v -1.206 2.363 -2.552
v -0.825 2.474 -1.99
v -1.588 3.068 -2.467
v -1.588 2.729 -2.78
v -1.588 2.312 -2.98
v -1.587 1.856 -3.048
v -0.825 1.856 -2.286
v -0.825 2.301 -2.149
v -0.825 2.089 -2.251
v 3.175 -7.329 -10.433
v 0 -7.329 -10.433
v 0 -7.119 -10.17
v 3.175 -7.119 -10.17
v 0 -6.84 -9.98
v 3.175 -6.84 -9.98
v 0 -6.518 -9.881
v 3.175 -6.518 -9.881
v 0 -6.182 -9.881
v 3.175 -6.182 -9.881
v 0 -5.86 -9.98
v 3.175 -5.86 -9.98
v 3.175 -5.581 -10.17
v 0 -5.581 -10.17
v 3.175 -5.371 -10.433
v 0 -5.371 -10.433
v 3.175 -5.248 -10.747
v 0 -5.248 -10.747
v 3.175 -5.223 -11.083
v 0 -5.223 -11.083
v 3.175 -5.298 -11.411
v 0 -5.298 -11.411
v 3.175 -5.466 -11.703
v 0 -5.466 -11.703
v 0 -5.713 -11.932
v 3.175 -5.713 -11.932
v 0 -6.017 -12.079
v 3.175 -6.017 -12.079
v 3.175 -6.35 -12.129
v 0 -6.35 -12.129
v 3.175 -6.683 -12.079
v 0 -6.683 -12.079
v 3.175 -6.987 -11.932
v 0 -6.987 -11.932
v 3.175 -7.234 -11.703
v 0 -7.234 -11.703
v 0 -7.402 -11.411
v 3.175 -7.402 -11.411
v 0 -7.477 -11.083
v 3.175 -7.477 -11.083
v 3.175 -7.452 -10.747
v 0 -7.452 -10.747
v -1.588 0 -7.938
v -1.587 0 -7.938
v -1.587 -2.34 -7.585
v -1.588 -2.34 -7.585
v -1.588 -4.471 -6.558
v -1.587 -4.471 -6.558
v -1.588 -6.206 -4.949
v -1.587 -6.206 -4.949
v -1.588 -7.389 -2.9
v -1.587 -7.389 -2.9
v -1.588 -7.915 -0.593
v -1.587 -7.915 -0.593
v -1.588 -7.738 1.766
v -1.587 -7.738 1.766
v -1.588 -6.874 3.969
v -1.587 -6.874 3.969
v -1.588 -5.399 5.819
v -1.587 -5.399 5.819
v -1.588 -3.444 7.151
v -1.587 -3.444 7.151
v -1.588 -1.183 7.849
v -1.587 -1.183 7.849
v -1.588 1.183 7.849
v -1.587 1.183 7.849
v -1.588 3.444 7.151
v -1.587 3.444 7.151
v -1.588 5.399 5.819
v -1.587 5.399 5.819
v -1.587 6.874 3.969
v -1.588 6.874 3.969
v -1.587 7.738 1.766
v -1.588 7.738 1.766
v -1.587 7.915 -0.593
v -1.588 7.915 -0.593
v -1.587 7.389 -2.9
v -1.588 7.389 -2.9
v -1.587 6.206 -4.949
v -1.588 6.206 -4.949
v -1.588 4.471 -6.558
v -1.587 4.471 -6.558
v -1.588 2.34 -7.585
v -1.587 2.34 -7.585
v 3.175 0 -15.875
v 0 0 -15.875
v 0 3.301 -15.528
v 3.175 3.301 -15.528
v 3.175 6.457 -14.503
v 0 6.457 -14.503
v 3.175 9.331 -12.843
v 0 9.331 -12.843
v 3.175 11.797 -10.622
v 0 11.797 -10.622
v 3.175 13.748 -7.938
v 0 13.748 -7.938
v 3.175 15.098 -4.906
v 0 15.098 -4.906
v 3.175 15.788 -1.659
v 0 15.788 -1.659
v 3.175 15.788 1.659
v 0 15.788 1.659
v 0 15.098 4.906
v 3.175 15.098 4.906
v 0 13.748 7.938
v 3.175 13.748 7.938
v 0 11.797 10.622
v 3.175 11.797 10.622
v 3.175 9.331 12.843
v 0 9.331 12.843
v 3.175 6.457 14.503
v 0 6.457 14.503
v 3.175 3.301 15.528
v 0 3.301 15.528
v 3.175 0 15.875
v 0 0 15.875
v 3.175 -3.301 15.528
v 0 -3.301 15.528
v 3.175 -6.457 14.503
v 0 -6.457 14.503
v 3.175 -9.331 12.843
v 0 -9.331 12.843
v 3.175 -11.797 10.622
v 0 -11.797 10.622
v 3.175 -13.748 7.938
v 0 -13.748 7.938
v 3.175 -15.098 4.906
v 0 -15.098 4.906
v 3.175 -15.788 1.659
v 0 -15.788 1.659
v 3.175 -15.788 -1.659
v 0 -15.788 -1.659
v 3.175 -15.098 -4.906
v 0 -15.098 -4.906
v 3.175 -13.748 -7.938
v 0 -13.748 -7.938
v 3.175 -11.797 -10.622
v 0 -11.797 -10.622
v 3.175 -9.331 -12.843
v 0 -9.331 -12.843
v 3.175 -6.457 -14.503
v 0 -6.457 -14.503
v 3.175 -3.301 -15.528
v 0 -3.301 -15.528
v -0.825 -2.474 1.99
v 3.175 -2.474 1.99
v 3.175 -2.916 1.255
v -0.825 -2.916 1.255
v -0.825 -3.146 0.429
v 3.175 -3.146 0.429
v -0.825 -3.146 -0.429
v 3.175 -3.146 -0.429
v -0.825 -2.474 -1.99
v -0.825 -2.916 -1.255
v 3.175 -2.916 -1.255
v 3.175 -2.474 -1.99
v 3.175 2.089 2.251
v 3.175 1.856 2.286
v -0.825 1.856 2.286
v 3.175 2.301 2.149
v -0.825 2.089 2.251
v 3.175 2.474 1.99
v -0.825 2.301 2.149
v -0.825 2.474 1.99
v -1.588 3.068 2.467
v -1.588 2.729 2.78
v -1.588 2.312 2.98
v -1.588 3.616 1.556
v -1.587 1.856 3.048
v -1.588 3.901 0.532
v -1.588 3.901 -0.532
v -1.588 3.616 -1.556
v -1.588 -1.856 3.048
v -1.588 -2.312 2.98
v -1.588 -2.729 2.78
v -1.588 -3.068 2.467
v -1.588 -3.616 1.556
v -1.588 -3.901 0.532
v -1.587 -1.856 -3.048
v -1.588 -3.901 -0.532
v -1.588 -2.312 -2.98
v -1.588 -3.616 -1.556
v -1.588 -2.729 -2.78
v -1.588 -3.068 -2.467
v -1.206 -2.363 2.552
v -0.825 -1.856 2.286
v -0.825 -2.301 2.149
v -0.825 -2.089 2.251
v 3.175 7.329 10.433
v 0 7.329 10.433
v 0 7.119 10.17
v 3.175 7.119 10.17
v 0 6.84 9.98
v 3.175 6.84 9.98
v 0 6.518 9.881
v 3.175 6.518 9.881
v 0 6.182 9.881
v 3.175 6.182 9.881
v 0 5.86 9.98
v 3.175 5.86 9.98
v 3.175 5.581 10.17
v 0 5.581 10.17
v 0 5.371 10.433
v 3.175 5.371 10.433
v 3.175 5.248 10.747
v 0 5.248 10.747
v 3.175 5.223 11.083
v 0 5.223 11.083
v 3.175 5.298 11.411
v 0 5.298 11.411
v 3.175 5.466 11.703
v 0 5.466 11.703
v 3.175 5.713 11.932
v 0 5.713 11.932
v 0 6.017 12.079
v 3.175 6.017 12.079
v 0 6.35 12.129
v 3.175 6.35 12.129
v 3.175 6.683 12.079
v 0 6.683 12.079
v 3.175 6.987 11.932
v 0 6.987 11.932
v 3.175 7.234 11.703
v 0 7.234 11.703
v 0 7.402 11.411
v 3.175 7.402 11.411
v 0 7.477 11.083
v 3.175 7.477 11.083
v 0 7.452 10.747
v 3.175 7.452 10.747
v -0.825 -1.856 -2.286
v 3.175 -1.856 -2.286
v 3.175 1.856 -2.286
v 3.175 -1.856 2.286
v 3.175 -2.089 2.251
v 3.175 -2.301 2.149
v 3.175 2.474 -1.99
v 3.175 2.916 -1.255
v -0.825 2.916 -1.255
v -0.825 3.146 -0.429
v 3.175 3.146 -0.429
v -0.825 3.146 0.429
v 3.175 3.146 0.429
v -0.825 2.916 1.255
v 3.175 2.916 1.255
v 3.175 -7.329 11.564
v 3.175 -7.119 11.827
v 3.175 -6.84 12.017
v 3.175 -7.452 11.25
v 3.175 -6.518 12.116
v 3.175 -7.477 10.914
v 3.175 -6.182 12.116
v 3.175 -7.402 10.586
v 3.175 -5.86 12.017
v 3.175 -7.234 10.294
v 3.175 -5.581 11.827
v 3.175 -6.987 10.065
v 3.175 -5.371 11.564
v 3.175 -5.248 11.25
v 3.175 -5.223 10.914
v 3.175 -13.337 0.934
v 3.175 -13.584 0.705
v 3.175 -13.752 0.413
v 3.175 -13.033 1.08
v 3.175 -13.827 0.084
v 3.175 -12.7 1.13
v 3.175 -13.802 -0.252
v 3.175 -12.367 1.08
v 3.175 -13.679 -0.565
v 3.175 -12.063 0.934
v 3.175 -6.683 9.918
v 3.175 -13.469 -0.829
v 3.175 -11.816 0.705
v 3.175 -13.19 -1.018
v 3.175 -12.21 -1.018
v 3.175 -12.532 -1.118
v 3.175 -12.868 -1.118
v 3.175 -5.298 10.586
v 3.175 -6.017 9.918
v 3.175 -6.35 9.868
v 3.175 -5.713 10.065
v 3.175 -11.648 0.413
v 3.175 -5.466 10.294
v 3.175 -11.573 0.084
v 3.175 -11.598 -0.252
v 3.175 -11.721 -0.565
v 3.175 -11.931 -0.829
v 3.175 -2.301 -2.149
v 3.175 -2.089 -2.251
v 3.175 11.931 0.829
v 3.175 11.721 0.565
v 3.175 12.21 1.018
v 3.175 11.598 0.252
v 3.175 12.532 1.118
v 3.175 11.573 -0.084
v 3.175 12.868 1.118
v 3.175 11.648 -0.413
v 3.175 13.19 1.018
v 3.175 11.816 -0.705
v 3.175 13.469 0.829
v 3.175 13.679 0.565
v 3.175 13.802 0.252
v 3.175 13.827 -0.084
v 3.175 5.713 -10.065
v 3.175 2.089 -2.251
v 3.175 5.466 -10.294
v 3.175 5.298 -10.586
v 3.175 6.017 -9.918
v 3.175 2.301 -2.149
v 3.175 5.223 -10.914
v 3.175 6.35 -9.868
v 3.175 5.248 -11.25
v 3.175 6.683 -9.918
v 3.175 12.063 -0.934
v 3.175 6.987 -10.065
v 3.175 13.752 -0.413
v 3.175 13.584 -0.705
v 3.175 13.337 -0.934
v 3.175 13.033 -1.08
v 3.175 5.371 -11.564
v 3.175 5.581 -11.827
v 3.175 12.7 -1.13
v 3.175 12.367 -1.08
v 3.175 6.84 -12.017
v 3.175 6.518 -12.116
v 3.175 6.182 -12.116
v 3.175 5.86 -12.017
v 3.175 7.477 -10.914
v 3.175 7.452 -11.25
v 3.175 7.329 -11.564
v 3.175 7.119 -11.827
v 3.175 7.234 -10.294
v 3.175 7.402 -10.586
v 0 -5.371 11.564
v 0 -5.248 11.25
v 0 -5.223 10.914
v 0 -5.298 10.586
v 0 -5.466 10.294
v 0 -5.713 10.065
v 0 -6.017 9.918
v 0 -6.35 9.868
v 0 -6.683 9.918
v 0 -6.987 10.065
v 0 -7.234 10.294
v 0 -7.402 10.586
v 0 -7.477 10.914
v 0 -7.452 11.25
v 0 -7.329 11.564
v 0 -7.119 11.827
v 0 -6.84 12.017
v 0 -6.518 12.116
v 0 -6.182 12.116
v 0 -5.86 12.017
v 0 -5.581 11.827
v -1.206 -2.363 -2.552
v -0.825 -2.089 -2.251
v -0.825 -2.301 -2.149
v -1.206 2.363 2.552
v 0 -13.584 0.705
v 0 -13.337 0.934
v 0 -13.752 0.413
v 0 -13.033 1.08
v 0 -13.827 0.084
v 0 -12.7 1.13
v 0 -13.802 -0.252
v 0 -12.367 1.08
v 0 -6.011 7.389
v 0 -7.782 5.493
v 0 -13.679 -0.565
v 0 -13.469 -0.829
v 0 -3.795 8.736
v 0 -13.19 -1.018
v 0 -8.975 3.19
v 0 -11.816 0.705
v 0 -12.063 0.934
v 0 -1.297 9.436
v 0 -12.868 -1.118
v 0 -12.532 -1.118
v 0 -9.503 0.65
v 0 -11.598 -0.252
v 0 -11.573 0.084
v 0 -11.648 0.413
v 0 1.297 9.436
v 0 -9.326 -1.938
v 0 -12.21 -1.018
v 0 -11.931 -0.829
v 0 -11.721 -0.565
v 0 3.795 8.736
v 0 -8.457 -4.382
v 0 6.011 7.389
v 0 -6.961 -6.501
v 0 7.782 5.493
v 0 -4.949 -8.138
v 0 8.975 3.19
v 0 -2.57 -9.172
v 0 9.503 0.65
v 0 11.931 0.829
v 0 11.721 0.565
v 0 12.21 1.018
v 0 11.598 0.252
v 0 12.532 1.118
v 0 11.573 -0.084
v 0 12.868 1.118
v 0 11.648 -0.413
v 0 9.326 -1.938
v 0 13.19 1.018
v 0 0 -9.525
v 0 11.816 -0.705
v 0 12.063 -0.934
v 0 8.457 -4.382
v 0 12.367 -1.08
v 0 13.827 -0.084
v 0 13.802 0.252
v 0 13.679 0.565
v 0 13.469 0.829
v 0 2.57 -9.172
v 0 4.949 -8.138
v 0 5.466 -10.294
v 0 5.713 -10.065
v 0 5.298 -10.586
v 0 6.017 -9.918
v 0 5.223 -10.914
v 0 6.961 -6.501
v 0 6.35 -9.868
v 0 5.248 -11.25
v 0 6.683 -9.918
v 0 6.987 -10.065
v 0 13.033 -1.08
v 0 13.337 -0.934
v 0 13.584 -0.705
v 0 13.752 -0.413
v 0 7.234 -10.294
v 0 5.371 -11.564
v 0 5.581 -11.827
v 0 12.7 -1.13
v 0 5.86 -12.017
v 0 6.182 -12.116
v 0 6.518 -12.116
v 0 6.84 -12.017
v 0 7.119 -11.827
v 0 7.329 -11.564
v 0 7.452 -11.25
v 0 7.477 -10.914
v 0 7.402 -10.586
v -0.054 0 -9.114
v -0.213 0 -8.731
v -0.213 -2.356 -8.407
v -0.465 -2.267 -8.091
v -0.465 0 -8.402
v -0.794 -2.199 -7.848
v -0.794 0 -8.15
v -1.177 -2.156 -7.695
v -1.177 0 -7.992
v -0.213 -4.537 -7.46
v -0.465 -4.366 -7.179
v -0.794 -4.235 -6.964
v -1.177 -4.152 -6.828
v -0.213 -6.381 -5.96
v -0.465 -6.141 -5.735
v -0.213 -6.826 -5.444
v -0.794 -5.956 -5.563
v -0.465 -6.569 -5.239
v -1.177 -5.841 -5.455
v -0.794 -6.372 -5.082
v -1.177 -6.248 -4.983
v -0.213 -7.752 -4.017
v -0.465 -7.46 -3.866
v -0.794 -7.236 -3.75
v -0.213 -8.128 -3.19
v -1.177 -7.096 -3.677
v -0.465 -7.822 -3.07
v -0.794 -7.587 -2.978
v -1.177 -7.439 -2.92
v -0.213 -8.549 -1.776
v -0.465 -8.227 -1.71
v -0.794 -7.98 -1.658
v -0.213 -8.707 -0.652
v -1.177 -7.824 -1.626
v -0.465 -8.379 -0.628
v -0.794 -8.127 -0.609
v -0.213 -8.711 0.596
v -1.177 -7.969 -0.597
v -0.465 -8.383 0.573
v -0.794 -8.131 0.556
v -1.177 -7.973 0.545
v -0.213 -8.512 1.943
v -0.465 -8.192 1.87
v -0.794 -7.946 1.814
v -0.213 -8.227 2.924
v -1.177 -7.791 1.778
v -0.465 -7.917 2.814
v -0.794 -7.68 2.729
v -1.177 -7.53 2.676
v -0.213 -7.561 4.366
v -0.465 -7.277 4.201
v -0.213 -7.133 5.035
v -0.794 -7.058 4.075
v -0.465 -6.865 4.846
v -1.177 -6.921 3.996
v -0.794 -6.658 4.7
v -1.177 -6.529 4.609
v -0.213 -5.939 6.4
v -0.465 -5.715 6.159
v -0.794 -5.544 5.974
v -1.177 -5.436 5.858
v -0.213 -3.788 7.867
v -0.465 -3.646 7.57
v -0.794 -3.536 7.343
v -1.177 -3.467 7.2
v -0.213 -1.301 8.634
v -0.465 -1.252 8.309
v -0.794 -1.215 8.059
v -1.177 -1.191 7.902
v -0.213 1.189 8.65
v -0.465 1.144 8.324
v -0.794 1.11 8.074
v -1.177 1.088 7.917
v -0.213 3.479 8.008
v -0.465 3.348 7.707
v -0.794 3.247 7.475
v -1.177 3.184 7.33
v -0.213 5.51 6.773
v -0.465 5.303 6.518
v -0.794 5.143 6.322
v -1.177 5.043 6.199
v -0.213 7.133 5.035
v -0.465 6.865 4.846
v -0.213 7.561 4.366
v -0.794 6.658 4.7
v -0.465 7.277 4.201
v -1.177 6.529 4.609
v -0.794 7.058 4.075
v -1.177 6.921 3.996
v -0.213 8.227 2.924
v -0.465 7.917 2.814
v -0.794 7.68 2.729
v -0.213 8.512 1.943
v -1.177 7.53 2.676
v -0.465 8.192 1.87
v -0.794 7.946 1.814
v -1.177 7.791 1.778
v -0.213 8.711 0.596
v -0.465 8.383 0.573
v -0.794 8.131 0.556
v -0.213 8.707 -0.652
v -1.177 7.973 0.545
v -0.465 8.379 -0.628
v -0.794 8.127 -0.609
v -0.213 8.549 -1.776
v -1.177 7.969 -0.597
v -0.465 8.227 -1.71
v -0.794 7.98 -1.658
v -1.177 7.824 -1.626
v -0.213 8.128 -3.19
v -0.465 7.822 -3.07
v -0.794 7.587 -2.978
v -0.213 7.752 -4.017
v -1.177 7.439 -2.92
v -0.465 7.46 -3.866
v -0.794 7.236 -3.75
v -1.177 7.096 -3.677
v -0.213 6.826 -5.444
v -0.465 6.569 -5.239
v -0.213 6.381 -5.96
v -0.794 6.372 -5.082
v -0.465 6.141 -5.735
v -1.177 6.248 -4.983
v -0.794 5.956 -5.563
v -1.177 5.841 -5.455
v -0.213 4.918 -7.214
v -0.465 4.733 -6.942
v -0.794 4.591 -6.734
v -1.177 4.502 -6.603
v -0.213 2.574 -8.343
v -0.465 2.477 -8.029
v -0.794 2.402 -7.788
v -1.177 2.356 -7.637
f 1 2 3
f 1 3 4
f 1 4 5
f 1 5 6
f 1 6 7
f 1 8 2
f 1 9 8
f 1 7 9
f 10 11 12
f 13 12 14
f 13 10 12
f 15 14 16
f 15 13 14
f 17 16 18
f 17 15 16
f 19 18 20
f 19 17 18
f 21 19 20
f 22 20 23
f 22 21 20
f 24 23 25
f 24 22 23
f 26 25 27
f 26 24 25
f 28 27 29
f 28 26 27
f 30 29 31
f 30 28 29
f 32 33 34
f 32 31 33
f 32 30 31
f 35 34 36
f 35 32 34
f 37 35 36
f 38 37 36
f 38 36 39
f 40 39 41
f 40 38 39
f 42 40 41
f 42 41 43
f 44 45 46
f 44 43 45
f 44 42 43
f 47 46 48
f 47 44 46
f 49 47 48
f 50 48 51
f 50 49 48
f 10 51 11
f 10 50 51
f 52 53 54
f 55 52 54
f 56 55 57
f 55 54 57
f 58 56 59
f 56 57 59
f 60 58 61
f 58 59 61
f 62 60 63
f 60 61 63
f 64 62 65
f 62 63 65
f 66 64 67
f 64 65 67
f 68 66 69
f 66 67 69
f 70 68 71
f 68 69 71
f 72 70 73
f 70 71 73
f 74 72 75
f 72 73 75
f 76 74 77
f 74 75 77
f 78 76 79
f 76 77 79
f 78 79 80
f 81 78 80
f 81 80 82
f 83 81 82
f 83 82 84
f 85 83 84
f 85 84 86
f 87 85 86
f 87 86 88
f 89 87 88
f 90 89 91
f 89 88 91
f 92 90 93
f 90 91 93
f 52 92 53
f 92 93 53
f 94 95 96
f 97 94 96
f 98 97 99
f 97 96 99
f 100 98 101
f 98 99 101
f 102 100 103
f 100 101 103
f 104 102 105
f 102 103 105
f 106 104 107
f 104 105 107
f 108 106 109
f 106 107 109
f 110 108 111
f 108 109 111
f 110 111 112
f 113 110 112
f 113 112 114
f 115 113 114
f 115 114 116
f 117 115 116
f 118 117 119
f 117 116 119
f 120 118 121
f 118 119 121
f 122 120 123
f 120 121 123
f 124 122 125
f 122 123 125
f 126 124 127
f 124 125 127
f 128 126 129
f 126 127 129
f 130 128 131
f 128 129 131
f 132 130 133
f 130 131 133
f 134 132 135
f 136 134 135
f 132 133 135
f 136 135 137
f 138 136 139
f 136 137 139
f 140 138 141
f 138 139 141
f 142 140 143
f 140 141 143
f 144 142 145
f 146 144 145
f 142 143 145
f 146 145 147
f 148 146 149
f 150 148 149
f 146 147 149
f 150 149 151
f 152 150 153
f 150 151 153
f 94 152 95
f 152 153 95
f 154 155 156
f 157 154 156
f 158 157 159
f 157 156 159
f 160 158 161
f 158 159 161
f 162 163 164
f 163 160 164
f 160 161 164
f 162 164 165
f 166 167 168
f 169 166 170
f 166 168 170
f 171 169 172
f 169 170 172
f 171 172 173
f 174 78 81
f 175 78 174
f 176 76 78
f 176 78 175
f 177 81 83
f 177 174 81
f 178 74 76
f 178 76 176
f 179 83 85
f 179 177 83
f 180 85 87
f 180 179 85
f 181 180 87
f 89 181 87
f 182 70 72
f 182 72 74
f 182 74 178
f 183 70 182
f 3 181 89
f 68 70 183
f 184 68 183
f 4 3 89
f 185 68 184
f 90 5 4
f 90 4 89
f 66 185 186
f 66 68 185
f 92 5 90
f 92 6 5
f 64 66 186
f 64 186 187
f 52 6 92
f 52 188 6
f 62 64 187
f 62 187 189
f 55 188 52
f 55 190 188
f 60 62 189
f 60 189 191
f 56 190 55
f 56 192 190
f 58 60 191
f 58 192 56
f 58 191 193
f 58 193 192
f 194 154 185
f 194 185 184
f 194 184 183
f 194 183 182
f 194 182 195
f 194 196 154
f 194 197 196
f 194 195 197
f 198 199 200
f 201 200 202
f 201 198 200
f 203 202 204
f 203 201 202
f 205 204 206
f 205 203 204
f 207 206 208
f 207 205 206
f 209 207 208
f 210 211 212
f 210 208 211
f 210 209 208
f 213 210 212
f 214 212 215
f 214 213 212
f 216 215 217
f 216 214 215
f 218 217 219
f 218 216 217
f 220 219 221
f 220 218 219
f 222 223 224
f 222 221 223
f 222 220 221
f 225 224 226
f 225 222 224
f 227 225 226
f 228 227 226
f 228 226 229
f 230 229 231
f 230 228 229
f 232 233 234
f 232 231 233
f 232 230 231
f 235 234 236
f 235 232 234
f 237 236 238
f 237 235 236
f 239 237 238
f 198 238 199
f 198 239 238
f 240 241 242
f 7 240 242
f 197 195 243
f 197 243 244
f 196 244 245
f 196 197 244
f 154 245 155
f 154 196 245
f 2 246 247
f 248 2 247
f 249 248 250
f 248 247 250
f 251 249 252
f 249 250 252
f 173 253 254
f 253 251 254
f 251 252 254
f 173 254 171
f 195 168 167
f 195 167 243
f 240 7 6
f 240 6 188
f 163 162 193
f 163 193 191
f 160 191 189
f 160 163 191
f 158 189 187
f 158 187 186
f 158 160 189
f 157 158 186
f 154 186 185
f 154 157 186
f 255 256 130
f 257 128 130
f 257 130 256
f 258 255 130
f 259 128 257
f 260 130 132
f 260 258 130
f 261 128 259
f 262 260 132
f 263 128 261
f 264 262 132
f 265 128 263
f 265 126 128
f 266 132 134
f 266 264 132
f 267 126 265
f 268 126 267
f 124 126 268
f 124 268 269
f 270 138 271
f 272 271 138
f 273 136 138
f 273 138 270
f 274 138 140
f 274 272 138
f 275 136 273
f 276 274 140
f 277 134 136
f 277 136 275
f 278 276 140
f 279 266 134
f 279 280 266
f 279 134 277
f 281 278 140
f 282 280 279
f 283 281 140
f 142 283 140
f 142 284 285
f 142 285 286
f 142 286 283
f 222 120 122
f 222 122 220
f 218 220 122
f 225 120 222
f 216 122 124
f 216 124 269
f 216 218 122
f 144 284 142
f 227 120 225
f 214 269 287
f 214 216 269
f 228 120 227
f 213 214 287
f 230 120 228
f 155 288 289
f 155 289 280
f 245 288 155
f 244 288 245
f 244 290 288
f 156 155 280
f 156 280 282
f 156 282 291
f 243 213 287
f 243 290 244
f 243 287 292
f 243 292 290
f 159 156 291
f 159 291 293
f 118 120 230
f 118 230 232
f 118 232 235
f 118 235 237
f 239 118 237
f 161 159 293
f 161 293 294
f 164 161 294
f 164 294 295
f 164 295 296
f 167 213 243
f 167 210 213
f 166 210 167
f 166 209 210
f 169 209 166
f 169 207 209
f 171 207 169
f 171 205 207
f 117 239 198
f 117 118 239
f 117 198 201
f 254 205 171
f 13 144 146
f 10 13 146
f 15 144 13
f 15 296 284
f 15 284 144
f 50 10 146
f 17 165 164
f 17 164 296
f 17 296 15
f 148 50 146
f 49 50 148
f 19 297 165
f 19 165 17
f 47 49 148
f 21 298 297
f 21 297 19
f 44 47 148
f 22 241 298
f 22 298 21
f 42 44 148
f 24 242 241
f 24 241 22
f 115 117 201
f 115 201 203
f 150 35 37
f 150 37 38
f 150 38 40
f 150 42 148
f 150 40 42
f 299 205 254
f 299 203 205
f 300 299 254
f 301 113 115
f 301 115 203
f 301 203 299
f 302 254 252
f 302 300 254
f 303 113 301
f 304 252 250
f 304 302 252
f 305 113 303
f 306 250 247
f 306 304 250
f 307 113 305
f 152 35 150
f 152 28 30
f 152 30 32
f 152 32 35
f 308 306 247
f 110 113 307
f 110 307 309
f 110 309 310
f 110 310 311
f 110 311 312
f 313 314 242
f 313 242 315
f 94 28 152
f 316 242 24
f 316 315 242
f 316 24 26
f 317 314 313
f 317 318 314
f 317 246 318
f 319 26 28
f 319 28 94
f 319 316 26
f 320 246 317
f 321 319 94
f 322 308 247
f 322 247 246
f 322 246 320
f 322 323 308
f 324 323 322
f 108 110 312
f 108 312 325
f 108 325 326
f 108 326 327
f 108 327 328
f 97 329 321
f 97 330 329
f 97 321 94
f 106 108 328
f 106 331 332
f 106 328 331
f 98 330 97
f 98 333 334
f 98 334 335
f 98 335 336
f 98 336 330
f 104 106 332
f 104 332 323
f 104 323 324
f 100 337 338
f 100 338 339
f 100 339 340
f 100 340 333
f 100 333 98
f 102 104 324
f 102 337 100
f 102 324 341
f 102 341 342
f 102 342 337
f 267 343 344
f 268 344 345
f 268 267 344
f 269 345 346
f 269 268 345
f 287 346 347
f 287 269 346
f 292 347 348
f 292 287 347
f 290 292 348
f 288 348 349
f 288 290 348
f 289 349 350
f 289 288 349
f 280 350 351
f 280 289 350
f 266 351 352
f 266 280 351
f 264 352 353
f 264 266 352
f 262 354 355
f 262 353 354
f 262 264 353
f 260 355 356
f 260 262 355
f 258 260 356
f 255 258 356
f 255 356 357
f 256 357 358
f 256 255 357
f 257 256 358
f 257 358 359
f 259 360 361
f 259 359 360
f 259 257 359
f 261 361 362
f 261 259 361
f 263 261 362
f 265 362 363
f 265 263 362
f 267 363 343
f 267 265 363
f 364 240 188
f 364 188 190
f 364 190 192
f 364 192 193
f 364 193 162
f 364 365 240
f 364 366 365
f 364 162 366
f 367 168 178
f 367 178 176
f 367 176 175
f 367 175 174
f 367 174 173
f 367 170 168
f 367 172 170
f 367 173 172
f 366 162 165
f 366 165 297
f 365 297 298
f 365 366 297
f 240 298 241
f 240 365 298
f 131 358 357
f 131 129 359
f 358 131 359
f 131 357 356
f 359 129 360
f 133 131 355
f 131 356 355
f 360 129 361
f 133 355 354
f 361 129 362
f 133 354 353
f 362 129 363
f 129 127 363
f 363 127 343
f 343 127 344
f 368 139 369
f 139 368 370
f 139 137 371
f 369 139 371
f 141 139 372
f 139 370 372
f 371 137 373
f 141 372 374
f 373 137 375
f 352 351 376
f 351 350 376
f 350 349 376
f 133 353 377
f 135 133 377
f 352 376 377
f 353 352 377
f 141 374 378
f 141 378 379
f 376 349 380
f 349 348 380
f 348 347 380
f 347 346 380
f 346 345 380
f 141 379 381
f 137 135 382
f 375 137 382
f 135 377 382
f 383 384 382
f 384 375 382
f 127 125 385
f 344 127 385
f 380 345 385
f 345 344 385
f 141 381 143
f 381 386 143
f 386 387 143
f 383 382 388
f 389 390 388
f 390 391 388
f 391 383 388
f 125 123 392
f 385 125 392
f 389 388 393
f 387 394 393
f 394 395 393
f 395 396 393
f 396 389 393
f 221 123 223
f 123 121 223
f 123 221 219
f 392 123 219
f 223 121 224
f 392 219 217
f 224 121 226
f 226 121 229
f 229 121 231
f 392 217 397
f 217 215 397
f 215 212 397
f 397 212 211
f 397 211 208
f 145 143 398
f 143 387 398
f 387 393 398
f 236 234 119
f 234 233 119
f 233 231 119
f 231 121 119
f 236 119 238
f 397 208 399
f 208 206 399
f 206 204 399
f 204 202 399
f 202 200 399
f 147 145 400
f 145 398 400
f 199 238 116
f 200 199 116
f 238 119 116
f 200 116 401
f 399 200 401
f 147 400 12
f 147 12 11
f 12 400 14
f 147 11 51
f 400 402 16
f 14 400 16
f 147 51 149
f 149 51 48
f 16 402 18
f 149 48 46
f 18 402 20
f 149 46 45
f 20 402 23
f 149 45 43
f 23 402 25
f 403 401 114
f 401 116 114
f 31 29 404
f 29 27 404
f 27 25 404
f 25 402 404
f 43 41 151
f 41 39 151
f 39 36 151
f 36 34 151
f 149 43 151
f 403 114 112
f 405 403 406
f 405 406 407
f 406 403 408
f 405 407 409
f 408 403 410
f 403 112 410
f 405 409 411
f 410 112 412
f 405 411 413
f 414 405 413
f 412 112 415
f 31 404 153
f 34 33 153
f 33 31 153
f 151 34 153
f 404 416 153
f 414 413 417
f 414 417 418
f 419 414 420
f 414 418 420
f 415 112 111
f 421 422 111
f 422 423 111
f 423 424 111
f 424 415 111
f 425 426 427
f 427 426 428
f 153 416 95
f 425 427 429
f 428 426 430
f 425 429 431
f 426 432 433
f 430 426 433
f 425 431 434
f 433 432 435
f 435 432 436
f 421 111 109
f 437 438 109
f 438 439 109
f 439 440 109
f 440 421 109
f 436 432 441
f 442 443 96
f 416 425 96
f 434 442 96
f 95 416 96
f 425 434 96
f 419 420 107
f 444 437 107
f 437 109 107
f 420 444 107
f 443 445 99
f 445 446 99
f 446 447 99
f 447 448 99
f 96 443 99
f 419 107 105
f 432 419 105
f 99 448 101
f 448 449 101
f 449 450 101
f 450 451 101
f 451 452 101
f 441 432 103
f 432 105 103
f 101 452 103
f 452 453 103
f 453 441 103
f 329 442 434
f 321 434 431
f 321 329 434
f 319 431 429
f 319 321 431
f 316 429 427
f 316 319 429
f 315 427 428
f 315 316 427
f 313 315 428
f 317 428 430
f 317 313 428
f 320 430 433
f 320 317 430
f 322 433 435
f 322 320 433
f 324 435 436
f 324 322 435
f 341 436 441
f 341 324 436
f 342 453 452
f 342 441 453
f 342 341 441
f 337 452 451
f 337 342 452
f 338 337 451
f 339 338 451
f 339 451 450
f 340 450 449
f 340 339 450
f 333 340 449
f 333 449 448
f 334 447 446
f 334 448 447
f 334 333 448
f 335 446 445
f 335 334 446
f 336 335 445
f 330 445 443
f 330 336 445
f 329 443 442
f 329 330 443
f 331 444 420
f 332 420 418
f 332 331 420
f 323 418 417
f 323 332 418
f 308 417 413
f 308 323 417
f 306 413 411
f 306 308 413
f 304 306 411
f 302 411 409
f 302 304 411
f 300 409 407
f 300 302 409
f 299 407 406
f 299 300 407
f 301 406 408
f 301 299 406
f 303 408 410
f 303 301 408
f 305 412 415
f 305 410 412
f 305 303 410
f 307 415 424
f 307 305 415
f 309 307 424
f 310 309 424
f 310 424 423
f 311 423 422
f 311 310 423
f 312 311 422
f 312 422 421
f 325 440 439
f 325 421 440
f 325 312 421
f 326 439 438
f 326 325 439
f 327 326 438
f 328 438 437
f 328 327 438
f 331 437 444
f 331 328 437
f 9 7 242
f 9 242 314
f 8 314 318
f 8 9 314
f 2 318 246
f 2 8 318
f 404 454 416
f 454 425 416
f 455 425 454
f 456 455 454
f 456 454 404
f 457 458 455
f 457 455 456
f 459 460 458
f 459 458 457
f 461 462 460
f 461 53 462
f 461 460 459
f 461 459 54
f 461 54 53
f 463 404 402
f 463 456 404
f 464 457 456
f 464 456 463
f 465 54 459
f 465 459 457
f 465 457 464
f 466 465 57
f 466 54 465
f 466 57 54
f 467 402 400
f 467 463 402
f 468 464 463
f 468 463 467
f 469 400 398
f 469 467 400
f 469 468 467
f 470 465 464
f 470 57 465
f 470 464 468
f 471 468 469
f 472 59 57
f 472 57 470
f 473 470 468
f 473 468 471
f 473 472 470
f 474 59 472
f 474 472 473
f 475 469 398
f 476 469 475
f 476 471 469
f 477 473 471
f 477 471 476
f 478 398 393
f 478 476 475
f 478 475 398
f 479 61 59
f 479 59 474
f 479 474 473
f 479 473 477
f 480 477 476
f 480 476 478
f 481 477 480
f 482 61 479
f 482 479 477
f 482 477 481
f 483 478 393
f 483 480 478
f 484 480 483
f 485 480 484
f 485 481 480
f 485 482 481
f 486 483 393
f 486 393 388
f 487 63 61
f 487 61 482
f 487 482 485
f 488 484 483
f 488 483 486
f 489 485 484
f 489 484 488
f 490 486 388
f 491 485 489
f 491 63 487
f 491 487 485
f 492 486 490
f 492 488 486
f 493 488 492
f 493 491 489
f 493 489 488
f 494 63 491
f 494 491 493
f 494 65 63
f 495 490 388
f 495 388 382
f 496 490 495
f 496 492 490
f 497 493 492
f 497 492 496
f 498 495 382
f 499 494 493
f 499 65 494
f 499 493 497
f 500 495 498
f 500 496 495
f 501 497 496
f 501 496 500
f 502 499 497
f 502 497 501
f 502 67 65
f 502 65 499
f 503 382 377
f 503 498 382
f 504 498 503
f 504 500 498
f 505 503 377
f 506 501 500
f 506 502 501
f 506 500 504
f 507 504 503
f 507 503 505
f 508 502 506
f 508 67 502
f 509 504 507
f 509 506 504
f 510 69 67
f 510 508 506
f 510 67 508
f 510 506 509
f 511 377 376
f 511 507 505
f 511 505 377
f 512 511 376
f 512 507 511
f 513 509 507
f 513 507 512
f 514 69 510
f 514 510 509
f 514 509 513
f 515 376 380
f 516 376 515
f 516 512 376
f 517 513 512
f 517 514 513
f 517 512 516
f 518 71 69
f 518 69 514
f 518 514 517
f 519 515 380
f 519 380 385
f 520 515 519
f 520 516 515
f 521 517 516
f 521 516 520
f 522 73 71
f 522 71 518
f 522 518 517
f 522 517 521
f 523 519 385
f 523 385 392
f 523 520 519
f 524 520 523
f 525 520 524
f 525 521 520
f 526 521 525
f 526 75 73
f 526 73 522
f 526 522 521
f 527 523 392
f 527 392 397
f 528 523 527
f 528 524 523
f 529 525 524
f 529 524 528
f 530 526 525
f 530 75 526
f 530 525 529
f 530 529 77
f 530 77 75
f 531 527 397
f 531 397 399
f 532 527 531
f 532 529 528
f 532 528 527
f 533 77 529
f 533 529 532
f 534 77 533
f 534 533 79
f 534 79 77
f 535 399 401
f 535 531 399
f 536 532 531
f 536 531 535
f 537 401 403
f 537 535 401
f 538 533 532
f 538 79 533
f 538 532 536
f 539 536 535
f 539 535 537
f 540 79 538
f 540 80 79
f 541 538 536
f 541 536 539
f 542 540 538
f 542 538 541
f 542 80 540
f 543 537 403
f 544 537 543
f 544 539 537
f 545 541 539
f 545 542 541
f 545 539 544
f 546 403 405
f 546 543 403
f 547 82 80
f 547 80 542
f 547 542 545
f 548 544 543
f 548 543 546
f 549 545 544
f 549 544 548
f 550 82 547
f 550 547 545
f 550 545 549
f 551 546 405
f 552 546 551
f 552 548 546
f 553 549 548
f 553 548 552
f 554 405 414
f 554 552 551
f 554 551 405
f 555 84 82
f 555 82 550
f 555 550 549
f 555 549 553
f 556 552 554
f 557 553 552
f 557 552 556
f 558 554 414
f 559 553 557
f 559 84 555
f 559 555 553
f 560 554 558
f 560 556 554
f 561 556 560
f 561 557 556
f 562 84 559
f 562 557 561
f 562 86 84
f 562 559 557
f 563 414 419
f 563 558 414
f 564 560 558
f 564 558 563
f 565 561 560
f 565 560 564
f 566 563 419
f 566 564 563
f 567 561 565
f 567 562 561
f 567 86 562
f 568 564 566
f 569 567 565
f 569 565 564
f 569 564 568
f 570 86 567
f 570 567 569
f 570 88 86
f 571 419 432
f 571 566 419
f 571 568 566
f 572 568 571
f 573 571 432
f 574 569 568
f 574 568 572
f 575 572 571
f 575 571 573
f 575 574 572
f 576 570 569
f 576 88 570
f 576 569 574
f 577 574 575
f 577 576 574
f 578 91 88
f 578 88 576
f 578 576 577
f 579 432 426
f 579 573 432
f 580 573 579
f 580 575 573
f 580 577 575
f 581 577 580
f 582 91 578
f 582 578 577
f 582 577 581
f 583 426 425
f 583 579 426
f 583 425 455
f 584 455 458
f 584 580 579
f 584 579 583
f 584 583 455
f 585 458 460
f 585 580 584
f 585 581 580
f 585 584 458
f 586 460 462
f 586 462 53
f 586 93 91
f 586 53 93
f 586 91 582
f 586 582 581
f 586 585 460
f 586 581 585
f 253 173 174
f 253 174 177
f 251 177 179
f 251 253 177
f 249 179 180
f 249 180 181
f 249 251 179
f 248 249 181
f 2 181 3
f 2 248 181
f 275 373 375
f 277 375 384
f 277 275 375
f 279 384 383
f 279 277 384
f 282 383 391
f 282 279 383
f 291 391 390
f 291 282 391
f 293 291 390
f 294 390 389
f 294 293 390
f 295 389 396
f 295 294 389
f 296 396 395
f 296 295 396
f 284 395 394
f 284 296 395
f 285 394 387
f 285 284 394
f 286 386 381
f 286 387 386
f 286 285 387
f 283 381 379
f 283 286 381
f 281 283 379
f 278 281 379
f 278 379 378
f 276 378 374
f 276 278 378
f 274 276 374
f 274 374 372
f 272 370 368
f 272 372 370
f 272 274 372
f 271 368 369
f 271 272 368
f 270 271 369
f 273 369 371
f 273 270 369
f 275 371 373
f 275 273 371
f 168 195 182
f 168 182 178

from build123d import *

# Parameters (mm, degrees)
SKETCH1_R           = 15.875
BOSS_EXTRUDE1_DEPTH = 3.175
SKETCH2_R           = 7.9375
BOSS_EXTRUDE2_DEPTH = 1.5875
CUT_EXTRUDE1_DEPTH  = 23.950221268
FILLET2_R           = 0.79375
CIRPATTERN1_COUNT   = 6
FILLET9_R           = 1.5875
CHAMFER1_SIZE       = 0.762


with BuildPart() as part:
    # Sketch1 → Boss-Extrude1 (new body)
    with BuildSketch(Plane(origin=(0, 0, 0), x_dir=(0, 0, -1), z_dir=(1, 0, 0))):
        Circle(SKETCH1_R)
    extrude(amount=BOSS_EXTRUDE1_DEPTH)

    # Sketch2 → Boss-Extrude2 (add)
    with BuildSketch(Plane.ZY):
        with Locations(Location((0, 0, 0), (0, 0, 180))):
            Circle(SKETCH2_R)
    extrude(amount=BOSS_EXTRUDE2_DEPTH)

    # Sketch3 → Cut-Extrude1 (cut, through all)
    with BuildSketch(Plane(origin=(3.175, 0, 0), x_dir=(0, 0, -1), z_dir=(1, 0, 0))):
        with BuildLine():
            Line((-2.286, 2.20336765), (-2.286, -2.20336765))
            ThreePointArc((-2.286, -2.20336765), (0, -3.175), (2.286, -2.20336765))
            Line((2.286, -2.20336765), (2.286, 2.20336765))
            ThreePointArc((2.286, 2.20336765), (0, 3.175), (-2.286, 2.20336765))
        make_face()
    extrude(amount=-CUT_EXTRUDE1_DEPTH, mode=Mode.SUBTRACT)

    # Fillet2
    fillet2_edges = [part.edges().sort_by_distance(p)[0] for p in [
        (0.79375, 2.20336765, 2.286),
        (0.79375, 2.20336765, -2.286),
        (0.79375, -2.20336765, -2.286),
        (0.79375, -2.20336765, 2.286),
    ]]
    fillet(fillet2_edges, radius=FILLET2_R)

    # Sketch5 → #4-40 Tapped Hole1 (revolve, cut)
    with BuildSketch(Plane(origin=(3.175, 12.7, 0), x_dir=(0, 0, -1), z_dir=(0, 1, 0))):
        Polygon((0, 0), (0, 8.299152758), (1.1303, 7.62), (1.1303, 0), align=None)
    f_4_40_tapped_hole1 = revolve(axis=Axis((9.525, 12.7, 0), (-1, 0, 0)), mode=Mode.SUBTRACT)

    # CirPattern1: #4-40 Tapped Hole1 ×6 about axis
    cirpattern1_axis = Axis((0, 0, 0), (1, 0, 0))
    for i in range(1, CIRPATTERN1_COUNT):
        add(f_4_40_tapped_hole1.rotate(cirpattern1_axis, i * 360 / CIRPATTERN1_COUNT), mode=Mode.SUBTRACT)

    # Fillet9
    fillet9_edges = [part.edges().sort_by_distance(p)[0] for p in [
        (0, 0, 7.9375),
    ]]
    fillet(fillet9_edges, radius=FILLET9_R - 0.0001)  # a hair under: the kernel refuses the full size

    # Chamfer1
    chamfer1_edges = [part.edges().sort_by_distance(p)[0] for p in [
        (-1.5875, 0, -2.286),
        (-1.5875, -3.175, 0),
        (-1.5875, 0, 2.286),
        (-1.5875, 3.175, 0),
        (-1.5875, -2.198617373, -2.208093398),
        (-1.5875, -2.198617373, 2.208093398),
        (-1.5875, 2.198617373, -2.208093398),
        (-1.5875, 2.198617373, 2.208093398),
    ]]
    chamfer(chamfer1_edges, length=CHAMFER1_SIZE)


solid = part.part
